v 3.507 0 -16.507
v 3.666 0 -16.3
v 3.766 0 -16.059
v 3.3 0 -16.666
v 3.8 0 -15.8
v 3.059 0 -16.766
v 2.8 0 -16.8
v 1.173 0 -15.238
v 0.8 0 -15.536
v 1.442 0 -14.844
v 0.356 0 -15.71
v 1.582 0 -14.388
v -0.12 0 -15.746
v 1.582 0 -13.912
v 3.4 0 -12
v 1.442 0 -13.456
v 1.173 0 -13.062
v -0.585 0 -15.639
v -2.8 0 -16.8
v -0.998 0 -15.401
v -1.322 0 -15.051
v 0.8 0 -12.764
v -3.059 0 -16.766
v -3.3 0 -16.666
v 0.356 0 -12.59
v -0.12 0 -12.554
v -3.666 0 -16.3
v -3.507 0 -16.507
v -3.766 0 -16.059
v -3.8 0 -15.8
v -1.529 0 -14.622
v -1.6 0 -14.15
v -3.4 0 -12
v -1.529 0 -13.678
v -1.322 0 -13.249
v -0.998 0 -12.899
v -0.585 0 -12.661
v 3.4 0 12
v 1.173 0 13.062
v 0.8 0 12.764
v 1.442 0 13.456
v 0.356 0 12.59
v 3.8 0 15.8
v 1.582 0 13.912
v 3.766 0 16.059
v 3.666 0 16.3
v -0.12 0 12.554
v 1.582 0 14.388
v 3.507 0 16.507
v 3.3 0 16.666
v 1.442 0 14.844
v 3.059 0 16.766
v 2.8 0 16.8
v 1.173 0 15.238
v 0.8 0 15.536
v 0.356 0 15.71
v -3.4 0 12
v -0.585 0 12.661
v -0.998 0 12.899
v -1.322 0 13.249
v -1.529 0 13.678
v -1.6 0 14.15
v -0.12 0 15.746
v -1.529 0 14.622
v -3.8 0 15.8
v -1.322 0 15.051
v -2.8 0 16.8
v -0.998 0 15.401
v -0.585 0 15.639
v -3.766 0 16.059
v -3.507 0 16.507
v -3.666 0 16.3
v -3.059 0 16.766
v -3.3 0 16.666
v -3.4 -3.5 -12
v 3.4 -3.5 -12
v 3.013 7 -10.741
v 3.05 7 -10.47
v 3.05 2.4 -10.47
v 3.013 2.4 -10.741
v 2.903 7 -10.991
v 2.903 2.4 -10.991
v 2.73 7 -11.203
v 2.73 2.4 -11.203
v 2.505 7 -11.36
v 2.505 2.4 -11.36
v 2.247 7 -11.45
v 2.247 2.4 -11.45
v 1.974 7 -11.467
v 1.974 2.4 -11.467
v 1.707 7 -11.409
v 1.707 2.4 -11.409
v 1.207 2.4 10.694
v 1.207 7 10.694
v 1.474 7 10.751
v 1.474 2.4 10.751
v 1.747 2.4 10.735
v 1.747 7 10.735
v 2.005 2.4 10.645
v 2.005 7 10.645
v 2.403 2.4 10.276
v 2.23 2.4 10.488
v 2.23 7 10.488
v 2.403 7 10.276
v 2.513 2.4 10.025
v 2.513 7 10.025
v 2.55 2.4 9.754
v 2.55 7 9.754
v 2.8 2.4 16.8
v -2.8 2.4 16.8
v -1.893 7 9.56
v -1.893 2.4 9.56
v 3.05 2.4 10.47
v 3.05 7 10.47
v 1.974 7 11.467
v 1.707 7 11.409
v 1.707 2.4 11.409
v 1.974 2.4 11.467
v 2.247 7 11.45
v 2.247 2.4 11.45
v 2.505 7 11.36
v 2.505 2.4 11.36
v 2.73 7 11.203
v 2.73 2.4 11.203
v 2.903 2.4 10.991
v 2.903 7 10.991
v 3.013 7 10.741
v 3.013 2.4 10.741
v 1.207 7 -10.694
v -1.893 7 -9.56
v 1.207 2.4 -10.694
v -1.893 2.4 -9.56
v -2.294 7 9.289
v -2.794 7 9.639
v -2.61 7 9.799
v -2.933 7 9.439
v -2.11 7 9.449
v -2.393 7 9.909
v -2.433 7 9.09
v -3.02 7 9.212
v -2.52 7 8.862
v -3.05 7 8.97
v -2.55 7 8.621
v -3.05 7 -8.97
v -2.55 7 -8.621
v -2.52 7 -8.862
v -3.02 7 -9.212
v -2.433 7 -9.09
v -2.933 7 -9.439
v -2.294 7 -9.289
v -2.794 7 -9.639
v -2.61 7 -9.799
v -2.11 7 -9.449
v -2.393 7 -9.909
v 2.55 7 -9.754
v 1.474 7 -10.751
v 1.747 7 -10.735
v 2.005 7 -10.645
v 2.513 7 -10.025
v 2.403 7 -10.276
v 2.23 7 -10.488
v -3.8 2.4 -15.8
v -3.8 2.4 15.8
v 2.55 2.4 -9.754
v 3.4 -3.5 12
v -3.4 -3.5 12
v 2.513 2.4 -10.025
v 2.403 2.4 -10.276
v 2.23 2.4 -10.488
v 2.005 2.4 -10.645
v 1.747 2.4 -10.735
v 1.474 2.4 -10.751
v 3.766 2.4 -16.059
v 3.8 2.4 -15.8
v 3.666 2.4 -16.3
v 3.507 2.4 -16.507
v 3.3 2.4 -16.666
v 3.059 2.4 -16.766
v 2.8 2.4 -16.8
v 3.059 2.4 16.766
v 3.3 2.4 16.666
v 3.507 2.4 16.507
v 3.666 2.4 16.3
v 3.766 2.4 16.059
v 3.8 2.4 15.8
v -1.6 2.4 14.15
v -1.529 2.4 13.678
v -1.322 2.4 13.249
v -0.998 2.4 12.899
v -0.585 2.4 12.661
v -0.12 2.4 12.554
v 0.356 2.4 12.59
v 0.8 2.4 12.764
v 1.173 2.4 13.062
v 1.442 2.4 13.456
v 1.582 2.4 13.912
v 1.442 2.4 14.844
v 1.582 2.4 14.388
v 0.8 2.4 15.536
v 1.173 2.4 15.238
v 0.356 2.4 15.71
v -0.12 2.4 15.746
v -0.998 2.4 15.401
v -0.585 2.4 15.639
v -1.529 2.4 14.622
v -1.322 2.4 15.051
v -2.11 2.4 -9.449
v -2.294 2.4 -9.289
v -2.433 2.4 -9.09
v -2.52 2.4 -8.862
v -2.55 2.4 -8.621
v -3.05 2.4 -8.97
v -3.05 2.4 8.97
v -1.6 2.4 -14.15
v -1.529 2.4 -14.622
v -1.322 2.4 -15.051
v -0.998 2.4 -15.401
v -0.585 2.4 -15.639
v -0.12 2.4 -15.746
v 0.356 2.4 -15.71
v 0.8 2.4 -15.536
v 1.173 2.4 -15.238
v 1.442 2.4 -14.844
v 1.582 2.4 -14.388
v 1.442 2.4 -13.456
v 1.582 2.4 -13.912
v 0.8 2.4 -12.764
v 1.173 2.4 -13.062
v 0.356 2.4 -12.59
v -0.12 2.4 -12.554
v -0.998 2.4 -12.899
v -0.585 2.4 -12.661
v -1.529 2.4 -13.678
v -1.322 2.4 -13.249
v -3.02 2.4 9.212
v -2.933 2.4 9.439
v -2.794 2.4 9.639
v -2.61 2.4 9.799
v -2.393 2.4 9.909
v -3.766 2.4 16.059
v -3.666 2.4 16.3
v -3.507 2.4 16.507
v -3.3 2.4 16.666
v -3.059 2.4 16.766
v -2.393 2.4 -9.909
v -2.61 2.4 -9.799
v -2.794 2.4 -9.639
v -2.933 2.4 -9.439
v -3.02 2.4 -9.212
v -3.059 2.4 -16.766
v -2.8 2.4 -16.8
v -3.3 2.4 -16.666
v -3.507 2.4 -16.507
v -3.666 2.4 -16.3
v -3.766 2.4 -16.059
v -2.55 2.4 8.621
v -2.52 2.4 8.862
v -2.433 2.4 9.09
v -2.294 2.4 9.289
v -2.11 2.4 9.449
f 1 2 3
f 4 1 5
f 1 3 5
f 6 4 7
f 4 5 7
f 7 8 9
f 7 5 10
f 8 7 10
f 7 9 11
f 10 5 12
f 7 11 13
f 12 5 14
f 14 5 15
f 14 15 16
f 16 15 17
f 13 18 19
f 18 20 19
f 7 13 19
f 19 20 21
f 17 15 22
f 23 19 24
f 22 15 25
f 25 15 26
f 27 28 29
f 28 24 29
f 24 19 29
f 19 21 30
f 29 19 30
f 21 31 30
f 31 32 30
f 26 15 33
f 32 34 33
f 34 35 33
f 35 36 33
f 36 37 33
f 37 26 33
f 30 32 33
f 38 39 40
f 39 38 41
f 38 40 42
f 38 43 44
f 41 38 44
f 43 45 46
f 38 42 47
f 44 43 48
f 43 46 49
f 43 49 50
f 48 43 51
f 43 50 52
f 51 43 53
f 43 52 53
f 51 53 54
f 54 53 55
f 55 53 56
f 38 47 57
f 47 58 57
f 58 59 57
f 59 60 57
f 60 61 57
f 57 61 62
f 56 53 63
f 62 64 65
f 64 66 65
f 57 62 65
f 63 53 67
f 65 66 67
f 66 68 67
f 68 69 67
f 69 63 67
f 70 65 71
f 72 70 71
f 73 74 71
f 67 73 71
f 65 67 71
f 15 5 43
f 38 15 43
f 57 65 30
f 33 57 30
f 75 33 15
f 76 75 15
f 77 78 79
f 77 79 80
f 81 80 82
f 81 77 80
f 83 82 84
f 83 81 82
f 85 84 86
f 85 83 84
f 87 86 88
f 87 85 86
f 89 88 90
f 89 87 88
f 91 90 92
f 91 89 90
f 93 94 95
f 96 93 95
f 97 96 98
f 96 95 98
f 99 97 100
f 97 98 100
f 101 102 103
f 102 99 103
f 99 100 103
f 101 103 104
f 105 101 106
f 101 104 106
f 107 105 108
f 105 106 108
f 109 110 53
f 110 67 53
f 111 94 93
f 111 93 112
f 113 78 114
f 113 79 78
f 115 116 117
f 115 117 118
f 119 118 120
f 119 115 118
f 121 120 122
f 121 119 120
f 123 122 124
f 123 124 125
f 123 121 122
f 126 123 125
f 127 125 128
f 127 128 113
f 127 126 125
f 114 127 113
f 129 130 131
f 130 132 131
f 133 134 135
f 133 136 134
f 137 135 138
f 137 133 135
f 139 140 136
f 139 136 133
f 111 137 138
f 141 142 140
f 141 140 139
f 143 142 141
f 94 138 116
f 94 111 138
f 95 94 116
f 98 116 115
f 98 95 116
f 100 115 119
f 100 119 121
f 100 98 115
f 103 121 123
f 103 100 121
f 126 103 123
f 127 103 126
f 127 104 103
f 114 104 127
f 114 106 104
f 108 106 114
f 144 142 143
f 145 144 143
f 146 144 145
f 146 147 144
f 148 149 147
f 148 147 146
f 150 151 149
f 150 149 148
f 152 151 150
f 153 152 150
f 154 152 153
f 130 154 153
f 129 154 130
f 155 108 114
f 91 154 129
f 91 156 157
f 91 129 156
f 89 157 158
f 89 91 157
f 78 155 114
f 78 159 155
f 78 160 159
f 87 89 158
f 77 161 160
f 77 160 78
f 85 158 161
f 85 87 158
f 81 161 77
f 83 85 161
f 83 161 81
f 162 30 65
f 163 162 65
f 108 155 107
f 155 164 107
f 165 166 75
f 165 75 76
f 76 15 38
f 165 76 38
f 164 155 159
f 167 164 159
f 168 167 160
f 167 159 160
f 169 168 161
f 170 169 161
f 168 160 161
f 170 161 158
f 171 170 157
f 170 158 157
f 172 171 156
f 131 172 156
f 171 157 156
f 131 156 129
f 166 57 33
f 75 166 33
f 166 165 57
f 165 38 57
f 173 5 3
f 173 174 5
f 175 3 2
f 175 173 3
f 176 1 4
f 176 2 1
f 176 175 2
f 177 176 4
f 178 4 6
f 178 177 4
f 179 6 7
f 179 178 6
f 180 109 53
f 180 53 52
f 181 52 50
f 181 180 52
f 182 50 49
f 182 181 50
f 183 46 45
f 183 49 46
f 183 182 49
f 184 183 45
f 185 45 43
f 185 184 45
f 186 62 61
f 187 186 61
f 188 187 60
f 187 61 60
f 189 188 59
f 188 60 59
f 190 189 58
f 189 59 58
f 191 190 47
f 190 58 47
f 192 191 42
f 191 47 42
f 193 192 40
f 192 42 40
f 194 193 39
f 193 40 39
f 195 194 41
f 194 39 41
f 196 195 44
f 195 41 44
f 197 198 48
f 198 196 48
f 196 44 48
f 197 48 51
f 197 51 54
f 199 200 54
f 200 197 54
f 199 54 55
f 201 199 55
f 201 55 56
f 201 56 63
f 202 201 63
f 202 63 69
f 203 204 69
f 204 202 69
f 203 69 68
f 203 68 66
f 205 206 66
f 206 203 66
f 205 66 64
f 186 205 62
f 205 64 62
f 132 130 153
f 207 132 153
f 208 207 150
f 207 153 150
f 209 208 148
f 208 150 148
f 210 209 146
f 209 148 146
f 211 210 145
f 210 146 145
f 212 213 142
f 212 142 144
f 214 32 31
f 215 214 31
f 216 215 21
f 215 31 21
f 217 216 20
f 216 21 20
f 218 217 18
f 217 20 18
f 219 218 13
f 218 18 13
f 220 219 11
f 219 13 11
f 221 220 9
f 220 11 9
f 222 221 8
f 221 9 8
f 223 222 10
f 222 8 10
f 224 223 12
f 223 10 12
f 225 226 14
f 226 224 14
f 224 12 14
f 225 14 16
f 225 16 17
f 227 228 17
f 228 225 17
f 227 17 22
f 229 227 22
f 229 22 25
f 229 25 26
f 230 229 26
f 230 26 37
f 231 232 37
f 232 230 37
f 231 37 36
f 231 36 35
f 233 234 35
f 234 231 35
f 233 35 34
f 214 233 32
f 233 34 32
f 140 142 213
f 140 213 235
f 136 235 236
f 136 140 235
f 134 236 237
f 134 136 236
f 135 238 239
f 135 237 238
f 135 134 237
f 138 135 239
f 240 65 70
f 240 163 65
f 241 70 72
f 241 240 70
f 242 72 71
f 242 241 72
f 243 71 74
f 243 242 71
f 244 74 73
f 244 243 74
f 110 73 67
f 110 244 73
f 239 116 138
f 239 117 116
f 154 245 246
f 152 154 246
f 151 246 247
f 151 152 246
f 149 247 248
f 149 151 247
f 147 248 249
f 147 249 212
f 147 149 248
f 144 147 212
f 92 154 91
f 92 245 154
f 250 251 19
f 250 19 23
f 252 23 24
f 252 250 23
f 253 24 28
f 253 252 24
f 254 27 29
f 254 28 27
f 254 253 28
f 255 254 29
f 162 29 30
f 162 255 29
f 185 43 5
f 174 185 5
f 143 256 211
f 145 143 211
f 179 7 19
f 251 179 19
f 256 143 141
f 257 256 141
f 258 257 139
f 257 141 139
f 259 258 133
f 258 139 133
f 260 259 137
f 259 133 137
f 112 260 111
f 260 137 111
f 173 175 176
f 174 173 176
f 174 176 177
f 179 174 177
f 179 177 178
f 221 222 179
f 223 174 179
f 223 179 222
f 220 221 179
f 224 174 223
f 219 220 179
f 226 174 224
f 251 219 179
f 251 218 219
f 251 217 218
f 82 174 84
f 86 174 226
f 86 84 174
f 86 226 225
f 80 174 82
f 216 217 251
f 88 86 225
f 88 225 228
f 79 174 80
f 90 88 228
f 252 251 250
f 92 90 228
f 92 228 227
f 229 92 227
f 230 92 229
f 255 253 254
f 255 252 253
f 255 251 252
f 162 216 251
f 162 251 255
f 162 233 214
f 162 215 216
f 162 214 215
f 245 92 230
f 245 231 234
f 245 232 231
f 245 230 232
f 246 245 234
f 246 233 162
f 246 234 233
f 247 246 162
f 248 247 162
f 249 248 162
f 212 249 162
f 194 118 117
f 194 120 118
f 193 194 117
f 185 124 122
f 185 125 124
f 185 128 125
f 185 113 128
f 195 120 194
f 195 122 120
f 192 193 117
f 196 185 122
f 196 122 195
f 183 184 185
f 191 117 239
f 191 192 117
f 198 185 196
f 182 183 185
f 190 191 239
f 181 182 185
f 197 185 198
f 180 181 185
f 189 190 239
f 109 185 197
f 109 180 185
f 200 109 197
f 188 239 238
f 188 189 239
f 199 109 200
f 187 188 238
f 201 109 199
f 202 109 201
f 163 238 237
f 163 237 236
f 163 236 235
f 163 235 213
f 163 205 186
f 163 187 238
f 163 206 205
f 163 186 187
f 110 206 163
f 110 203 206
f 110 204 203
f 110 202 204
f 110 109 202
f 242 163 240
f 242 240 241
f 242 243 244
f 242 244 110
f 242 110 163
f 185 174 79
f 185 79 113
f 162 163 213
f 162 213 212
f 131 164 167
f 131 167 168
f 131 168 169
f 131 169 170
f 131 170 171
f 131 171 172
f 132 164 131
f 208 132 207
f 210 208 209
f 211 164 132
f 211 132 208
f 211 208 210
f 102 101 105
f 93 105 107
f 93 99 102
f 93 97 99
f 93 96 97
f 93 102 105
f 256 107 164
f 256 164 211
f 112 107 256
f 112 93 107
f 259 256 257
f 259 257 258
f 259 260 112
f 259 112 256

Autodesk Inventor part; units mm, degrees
ref_plane "YZ Plane" through (0, 0, 0) normal (1, 0, 0) x (0, 1, 0)
ref_plane "XZ Plane" through (0, 0, 0) normal (0, 1, 0) x (-1, 0, 0)
ref_plane "XY Plane" through (0, 0, 0) normal (0, 0, 1) x (1, 0, 0)
sketch "Sketch1" plane through (0, 0, 0) normal (0, 1, 0) x (-1, 0, 0)
  line L0 (3.8, 16.8) -> (-3.8, 16.8)
  line L1 (-3.8, 16.8) -> (-3.8, -16.8)
  line L2 (-3.8, -16.8) -> (3.8, -16.8)
  line L3 (3.8, -16.8) -> (3.8, 16.8)
  circle A0 centre (0, 14.15) radius 1.6
  circle A1 centre (0, -14.15) radius 1.6
  point P0 (0, 0)
  dimension "d0" = 33.6
  dimension "d1" = 7.6
  dimension "d2" = 16.8
  dimension "d3" = 3.8
  dimension "d4" = 3.2
  dimension "d5" = 3.2
  dimension "d6" = 28.3
  dimension "d7" = 14.15
extrude "Extrusion1" add sketch "Sketch1" along normal blind 2.4
fillet "Fillet1" radius 1 4 edges at (3.8, 1.2, 16.8) (-3.8, 1.2, 16.8) (3.8, 1.2, -16.8) (-3.8, 1.2, -16.8)
sketch "Sketch2" plane through (0, 2.4, 0) normal (0, 1, 0) x (1, 0, 0)
  line L0 (-3.05, -9.6694) -> (-3.05, 9.6694)
  line L1 (-3.05, 9.6694) -> (3.05, 11.9)
  line L2 (3.05, 11.9) -> (3.05, -11.9)
  line L3 (3.05, -11.9) -> (-3.05, -9.6694)
  line L4 (2.55, -11.1848) -> (-2.55, -9.3198)
  line L5 (-2.55, -9.3198) -> (-2.55, 9.3198)
  line L6 (-2.55, 9.3198) -> (2.55, 11.1848)
  line L7 (2.55, 11.1848) -> (2.55, -11.1848)
  point P0 (0, 0)
  dimension "d11" = 69.914
  dimension "d13" = 23.8
  dimension "d14" = 6.1
  dimension "d15" = 3.05
  dimension "d17" = 0.5
  dimension "d18" = 0.5
  dimension "d19" = 0.5
  dimension "d20" = 0.5
  dimension "d21" = 11.9
  dimension "d22" = 69.914
  dimension "d23" = 69.914
extrude "Extrusion2" add sketch "Sketch2" along normal blind 4.6
fillet "Fillet2" radius 1 8 edges at (-3.05, 4.7, -9.6694) (-3.05, 4.7, 9.6694) (3.05, 4.7, 11.9) (3.05, 4.7, -11.9) (-2.55, 4.7, -9.3198) (-2.55, 4.7, 9.3198) (2.55, 4.7, -11.1848) (2.55, 4.7, 11.1848)
sketch "Sketch3" plane through (0, 0, 0) normal (0, -1, 0) x (1, 0, 0)
  line L0 (3.4, 12) -> (-3.4, 12)
  line L1 (-3.4, 12) -> (-3.4, -12)
  line L2 (-3.4, -12) -> (3.4, -12)
  line L3 (3.4, -12) -> (3.4, 12)
  point P0 (0, 0)
  dimension "d27" = 24
  dimension "d28" = 6.8
  dimension "d29" = 12
  dimension "d30" = 3.4
extrude "Extrusion3" add sketch "Sketch3" along normal blind 3.5
equation "\"d2\" = 0.5 * d0"
equation "\"d3\" = 0.5 * d1"
equation "\"d5\" = d4"
equation "\"d7\" = 0.5 * d6"
equation "\"d15\" = 0.5 * d14"
equation "\"d21\" = 0.5 * d13"
equation "\"d22\" = d11"
equation "\"d29\" = 0.5 * d27"
equation "\"d30\" = 0.5 * d28"
properties part number "31pin female connector"
